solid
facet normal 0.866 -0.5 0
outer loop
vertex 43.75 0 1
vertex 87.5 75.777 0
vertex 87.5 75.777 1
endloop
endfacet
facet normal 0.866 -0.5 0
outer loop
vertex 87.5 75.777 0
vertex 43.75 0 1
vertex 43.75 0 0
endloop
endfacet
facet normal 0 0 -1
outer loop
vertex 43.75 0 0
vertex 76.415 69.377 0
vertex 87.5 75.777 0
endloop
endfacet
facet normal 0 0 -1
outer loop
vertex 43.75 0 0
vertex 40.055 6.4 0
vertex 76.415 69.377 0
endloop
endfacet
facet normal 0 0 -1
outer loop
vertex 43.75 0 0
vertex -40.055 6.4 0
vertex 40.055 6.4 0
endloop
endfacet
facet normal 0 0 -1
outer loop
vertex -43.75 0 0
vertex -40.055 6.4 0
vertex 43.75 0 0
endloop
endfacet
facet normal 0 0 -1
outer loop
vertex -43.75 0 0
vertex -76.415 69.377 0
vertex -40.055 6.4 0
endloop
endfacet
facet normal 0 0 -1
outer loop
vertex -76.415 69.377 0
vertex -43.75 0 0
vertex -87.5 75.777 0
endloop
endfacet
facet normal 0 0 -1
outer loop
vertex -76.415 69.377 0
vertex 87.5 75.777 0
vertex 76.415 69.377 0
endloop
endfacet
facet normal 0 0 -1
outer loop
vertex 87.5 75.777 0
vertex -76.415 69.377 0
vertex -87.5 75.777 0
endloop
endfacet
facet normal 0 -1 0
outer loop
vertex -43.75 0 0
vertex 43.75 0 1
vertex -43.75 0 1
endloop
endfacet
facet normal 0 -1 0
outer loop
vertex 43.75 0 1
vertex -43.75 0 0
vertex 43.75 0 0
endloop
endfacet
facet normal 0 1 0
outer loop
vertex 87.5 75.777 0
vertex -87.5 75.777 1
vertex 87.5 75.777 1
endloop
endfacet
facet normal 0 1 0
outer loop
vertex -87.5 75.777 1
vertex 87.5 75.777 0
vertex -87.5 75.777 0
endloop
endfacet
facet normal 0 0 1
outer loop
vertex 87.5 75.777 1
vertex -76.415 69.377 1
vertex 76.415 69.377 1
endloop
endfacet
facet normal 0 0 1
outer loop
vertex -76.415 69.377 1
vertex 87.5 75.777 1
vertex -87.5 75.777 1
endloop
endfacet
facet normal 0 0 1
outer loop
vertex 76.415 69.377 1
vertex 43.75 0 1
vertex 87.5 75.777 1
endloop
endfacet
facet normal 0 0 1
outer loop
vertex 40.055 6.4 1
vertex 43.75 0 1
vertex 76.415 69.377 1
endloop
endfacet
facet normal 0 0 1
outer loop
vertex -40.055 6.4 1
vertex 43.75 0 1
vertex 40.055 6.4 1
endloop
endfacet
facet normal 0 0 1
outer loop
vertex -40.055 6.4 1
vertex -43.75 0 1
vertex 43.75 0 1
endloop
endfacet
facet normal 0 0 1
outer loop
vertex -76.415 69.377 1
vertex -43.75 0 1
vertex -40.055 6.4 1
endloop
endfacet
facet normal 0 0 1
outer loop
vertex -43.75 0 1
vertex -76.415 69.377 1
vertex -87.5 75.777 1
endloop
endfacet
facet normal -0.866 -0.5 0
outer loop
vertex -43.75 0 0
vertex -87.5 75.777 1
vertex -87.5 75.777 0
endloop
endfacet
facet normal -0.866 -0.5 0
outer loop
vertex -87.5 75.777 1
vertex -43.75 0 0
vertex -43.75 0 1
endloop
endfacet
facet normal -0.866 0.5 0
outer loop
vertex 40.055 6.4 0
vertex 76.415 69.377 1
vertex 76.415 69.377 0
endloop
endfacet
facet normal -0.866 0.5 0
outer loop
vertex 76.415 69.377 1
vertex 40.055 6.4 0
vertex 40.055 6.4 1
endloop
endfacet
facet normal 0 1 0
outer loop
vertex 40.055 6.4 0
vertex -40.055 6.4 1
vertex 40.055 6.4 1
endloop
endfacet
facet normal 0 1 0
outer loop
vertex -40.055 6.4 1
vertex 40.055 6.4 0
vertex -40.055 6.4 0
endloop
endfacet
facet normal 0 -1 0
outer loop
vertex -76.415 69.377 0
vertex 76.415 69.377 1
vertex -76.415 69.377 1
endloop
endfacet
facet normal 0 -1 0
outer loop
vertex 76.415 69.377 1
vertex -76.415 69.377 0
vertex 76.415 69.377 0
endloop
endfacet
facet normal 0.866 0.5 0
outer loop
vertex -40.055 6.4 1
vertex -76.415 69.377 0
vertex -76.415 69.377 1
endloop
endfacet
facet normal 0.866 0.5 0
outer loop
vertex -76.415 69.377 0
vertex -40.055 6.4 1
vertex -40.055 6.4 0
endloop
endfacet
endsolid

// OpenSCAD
// file: ../../modules/flatScrew.scad
module flatScrewHole(rh, rs, d, ds, t = .1) {
  translate([0, 0, -t]) cylinder(h = d + t, r = rs);
  translate([0, 0, d - ds + t]) cylinder(h = ds + t, r = rh);
}
// file: ../../modules/hexagon.scad
module hexagon(r = 1) {
  polygon([
    [-1 * r, 0],
    [-.5 * r, r * sqrt(3) / 2],
    [.5 * r, r * sqrt(3) / 2],
    [1 * r, 0],
    [.5 * r, r * sqrt(3) / -2],
    [-.5 * r, r * sqrt(3) / -2],
  ]);
}
// file: _common.scad
$fa=4; // default minimum facet angle is now 0.5
$fs=0.05; // default minimum facet size is now 0.05 mm

include <../../modules/hexagon.scad>
include <../../modules/flatScrew.scad>

height = 25;
totalWidth = 350;
wallThickness = 6.4;
baseThickness = 3.2;

// M3 screw
screwRad = 1.6;
screwHeadRad = 3;
nutRad = 3.2;

//8020 Bolt
boltRad = 3.1;
boltHeadRad = 6;

// Corner
cornerBaseThickness = 2.4;
cornerRuneLen = 30;
bracketGap = 25;
runeLen = 150;
runeInternalOffset = .1;

// Side
sideWallThickness = wallThickness / 2;
diceLen = 150;
sideDiceLen = 15;
sideBaseThickness = cornerBaseThickness;
// main file
include <_common.scad>

edgeLength = totalWidth / 4;
outerEdgeLength = edgeLength * 2;
ri = sqrt(3) / 2 * outerEdgeLength;

difference() {
  linear_extrude(1) polygon(points = [
    [edgeLength / -2, 0],
    [edgeLength / 2, 0],
    [edgeLength, ri / 2],
    [-edgeLength, ri / 2]
  ]);

  translate([0, 0, -.05]) linear_extrude(1.1) offset(r = -wallThickness) polygon(points = [
    [edgeLength / -2, 0],
    [edgeLength / 2, 0],
    [edgeLength, ri / 2],
    [-edgeLength, ri / 2]
  ]);
}
